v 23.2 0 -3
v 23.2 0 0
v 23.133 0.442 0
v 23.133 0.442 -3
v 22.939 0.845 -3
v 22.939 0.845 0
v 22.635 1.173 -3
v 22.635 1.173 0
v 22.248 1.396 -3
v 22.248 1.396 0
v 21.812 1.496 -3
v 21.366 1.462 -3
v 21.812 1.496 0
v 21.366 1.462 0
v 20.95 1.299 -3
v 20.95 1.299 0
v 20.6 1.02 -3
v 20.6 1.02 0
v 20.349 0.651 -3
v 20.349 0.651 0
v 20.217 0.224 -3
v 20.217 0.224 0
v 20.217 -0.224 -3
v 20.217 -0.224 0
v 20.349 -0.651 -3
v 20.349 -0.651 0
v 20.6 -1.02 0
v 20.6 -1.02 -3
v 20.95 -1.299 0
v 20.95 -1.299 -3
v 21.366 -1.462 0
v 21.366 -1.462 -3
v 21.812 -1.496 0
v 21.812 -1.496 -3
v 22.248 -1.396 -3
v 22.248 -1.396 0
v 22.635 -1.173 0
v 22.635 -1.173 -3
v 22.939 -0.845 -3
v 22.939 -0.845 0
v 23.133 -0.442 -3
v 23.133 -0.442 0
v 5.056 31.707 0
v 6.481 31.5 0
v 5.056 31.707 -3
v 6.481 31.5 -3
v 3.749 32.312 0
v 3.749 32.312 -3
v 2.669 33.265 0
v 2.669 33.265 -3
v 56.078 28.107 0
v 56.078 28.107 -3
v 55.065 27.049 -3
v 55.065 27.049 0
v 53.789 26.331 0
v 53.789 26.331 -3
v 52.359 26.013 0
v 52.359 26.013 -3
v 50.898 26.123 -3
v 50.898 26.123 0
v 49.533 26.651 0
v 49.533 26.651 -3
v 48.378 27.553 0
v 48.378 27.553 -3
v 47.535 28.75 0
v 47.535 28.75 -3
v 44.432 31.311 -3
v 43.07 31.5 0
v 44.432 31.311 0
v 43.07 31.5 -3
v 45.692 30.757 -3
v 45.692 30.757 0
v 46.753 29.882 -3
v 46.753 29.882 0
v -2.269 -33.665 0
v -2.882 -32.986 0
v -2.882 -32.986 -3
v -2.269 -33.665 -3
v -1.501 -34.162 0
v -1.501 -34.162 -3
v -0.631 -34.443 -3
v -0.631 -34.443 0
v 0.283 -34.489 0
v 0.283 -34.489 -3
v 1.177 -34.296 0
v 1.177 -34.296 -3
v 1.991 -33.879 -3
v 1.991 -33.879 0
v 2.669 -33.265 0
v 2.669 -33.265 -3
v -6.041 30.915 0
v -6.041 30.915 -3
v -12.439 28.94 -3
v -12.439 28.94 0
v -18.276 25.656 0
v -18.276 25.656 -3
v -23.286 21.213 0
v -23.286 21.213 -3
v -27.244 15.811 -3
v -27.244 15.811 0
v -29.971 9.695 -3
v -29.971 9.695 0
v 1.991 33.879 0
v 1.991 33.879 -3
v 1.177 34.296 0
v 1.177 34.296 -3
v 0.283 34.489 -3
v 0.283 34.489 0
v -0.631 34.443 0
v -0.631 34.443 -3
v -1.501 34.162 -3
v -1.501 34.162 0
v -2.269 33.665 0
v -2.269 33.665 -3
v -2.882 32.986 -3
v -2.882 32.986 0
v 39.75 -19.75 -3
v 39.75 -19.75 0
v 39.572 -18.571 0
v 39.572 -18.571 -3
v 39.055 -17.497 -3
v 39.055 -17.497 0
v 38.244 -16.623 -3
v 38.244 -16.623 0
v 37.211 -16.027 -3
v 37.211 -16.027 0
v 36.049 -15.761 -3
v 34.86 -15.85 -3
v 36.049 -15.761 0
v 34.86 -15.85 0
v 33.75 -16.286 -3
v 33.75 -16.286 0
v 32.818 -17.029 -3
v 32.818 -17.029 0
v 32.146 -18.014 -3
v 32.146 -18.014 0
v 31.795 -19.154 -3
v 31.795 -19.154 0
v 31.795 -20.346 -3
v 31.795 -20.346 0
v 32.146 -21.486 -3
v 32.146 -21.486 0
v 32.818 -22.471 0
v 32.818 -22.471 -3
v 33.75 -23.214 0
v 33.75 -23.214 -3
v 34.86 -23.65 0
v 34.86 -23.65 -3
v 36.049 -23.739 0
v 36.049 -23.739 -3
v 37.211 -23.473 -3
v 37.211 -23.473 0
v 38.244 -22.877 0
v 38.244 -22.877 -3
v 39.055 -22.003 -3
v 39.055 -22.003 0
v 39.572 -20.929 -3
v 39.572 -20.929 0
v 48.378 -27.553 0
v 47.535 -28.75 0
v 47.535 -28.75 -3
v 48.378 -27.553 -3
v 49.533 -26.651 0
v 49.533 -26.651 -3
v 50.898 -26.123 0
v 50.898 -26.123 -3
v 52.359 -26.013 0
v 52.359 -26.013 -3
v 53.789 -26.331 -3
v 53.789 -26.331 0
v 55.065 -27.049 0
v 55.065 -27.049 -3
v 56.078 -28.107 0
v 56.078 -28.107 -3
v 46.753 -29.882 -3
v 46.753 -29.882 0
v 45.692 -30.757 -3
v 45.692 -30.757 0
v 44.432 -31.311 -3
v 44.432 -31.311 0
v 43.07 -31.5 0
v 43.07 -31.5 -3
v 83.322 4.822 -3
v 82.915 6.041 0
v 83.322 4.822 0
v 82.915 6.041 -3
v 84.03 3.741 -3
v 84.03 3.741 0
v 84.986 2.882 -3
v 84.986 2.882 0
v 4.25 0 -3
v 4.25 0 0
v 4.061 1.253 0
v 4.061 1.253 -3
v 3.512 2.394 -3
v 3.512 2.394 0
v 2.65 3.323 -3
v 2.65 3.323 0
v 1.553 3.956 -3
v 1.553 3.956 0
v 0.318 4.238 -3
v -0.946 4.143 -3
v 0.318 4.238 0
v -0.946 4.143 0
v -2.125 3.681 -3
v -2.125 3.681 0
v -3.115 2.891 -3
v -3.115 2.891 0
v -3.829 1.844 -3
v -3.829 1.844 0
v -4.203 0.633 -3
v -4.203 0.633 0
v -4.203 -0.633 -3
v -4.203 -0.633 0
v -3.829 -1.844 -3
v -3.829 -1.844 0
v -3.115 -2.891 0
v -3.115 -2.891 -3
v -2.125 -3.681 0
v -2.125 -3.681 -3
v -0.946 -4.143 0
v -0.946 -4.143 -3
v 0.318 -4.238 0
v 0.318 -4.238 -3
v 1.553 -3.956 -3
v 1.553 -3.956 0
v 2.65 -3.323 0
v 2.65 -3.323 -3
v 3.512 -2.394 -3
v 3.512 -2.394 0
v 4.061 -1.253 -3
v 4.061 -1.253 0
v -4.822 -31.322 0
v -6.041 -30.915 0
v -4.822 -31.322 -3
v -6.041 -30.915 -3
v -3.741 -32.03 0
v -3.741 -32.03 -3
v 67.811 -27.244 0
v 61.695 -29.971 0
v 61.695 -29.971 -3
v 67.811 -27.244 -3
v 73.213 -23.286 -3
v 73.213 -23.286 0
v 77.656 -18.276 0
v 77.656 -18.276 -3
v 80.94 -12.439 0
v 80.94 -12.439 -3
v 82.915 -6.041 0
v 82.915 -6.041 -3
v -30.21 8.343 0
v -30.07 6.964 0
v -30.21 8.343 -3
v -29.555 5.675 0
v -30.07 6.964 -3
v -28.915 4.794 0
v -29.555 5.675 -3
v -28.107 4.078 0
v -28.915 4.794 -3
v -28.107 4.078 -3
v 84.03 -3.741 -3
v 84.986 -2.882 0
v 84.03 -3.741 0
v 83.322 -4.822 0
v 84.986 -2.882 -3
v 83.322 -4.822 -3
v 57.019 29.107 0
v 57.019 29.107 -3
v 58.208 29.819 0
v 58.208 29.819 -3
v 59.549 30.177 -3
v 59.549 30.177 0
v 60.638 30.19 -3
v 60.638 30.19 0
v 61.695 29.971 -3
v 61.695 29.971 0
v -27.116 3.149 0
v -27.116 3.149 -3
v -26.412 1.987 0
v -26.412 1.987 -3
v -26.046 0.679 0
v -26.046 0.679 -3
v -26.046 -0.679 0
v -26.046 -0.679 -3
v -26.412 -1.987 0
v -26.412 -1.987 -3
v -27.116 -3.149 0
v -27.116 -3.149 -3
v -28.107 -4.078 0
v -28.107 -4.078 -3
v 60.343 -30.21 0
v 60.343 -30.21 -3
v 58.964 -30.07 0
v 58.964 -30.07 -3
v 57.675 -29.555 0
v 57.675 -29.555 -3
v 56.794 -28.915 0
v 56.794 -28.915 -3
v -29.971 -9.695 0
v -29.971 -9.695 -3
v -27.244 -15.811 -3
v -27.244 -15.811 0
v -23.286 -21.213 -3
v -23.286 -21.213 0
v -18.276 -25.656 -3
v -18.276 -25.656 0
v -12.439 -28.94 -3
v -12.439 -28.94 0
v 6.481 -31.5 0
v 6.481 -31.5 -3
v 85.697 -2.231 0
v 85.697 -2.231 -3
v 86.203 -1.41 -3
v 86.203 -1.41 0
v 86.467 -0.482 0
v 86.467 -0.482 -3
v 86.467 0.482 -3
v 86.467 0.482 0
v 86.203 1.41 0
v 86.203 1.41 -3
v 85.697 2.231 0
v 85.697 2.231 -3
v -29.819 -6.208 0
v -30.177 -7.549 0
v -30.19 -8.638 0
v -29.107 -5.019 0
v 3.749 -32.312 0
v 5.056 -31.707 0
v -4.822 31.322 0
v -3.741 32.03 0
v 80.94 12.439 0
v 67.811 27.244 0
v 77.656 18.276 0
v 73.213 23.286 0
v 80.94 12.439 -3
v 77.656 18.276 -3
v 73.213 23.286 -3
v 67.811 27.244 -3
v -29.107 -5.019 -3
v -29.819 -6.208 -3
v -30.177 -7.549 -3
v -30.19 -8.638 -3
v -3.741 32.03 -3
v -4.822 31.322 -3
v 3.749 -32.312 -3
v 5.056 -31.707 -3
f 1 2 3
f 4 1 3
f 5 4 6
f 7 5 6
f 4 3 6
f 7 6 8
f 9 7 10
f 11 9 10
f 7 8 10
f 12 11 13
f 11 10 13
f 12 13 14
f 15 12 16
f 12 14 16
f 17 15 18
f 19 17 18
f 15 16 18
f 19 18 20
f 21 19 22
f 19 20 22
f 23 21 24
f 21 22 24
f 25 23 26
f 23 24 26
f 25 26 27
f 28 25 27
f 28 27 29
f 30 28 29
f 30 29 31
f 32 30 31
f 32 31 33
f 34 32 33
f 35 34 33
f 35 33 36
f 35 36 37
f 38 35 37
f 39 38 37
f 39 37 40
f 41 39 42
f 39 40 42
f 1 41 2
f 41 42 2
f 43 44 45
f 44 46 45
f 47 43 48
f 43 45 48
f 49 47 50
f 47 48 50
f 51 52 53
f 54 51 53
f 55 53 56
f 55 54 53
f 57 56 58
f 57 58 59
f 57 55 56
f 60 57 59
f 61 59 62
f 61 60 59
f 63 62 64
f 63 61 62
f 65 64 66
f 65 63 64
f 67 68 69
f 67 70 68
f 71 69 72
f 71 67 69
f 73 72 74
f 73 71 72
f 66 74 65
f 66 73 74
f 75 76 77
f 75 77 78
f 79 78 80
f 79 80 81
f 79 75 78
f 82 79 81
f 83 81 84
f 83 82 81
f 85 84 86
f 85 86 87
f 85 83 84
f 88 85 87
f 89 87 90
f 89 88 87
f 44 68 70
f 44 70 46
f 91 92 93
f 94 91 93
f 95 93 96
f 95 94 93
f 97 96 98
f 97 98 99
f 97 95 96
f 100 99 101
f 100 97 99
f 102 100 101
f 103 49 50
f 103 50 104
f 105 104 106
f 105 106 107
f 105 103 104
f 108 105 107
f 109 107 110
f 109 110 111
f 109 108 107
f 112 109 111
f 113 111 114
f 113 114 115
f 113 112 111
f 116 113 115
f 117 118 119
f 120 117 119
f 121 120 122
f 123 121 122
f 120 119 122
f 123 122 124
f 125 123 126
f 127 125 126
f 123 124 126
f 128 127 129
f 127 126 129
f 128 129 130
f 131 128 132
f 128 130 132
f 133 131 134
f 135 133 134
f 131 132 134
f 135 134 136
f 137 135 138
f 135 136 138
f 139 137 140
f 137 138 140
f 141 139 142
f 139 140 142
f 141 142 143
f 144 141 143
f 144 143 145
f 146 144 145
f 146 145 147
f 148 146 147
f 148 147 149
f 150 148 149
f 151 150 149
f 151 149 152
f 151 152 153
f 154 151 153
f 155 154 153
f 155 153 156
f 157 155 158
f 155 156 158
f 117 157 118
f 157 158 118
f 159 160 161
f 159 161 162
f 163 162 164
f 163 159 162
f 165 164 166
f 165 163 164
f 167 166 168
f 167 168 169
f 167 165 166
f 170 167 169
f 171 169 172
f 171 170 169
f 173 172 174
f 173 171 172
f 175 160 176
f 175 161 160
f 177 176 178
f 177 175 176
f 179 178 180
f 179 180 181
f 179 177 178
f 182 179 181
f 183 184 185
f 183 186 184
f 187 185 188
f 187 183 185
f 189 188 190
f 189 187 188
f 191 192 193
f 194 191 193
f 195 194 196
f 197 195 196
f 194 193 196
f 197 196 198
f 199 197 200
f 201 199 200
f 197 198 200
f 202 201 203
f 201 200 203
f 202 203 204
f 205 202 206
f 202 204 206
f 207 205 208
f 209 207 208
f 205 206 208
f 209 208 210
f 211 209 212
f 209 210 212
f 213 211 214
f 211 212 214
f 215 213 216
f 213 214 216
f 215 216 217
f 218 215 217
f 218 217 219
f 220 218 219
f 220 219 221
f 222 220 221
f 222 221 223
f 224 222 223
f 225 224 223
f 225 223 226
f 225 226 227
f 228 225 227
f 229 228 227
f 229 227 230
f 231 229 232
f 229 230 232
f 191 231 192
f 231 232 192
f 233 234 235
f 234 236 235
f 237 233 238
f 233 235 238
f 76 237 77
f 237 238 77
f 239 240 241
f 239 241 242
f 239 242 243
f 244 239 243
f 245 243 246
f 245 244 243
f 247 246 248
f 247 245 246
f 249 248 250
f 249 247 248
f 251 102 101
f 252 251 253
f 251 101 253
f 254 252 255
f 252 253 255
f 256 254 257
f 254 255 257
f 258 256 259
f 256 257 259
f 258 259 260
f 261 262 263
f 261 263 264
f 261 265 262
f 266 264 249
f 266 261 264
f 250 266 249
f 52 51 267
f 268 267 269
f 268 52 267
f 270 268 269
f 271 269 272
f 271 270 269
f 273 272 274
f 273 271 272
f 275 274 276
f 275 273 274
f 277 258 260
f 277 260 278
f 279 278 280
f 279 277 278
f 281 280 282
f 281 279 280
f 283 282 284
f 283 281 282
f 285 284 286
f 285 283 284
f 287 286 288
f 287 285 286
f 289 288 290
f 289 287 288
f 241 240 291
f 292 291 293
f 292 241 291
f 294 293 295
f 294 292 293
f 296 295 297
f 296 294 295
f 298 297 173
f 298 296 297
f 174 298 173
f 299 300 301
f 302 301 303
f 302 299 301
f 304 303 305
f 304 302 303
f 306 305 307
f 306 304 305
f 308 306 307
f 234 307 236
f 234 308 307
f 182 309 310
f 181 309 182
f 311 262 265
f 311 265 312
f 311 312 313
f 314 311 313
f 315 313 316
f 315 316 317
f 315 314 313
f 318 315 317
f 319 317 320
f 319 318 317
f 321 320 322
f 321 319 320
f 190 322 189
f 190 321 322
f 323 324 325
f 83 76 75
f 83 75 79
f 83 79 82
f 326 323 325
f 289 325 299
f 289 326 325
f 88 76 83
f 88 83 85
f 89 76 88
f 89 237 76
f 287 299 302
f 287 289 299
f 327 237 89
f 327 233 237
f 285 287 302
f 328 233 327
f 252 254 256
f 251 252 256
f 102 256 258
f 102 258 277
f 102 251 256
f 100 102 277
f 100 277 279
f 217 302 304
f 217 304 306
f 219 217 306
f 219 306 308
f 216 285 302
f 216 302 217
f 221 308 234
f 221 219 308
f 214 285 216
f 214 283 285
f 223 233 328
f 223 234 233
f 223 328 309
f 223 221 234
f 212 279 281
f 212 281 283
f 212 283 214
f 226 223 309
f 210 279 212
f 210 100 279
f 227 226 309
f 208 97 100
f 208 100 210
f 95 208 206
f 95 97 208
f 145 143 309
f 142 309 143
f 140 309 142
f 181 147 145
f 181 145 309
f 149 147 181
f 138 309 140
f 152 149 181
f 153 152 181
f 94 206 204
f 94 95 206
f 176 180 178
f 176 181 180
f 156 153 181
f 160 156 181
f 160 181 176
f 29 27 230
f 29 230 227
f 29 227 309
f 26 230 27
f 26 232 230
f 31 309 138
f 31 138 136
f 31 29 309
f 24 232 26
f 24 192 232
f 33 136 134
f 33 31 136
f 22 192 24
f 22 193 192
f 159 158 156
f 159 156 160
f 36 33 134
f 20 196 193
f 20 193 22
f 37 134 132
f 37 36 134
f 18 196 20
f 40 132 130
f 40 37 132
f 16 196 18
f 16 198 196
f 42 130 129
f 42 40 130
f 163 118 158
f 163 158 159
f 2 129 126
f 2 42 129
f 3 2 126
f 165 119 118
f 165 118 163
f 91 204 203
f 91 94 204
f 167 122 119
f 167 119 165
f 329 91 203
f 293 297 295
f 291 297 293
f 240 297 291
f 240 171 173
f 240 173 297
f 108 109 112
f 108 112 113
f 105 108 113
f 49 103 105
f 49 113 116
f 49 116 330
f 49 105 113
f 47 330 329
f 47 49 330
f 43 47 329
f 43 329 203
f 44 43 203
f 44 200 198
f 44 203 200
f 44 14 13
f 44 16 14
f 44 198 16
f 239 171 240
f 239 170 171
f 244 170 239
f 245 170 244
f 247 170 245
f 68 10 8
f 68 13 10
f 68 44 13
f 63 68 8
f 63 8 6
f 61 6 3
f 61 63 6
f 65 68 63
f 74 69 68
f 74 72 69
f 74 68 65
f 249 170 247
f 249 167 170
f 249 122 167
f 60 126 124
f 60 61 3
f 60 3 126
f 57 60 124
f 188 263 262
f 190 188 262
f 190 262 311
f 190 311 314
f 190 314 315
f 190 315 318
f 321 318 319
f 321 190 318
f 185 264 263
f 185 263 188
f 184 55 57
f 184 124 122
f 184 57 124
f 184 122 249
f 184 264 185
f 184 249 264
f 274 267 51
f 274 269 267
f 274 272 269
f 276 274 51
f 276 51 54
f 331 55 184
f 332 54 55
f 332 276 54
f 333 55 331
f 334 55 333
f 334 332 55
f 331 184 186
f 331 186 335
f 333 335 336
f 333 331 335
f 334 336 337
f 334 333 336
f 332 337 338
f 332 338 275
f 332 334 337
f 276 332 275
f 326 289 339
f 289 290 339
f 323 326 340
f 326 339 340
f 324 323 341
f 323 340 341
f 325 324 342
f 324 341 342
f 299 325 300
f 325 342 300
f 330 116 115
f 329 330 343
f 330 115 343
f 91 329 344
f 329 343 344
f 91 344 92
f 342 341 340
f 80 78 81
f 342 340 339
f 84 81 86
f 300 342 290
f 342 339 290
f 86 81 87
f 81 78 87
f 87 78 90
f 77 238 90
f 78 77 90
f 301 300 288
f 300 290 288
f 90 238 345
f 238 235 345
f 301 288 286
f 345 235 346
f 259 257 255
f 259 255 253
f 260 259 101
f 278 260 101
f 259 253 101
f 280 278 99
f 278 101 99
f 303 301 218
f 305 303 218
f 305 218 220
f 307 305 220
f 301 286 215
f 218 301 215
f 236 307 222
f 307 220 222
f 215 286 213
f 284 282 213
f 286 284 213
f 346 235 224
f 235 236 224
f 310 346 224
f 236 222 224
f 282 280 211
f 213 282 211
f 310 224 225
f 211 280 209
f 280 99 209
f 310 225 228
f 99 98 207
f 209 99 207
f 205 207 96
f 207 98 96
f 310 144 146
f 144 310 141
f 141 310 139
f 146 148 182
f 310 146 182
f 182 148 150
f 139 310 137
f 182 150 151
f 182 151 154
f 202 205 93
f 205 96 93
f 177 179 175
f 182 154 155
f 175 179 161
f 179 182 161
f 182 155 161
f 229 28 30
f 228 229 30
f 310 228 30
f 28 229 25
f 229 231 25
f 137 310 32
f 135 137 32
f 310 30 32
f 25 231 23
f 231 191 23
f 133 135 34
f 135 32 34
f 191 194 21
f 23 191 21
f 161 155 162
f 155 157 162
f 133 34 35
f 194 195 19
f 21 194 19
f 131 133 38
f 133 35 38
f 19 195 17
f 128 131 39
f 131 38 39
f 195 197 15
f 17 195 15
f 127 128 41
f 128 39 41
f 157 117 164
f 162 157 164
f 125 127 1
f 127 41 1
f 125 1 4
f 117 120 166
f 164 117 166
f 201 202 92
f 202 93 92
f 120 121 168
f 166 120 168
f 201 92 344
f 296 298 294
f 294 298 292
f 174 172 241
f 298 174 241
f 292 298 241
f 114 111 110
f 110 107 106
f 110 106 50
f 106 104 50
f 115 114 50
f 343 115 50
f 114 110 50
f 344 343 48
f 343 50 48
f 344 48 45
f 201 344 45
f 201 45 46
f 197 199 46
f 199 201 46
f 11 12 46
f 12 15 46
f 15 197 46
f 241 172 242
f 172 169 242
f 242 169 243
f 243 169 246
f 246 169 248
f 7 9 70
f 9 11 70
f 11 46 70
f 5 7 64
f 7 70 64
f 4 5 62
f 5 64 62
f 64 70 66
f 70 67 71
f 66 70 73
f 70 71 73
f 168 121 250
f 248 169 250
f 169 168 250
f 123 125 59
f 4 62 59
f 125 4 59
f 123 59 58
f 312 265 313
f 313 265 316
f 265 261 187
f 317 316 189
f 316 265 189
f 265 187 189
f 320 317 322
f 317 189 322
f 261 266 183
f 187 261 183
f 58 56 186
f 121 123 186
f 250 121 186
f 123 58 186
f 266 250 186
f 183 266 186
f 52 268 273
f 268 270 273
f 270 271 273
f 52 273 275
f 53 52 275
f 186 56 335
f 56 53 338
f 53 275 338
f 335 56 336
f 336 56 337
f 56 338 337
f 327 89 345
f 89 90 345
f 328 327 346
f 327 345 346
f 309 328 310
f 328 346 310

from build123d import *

# Parameters (mm, degrees)
SKETCH1_R           = 4
SKETCH1_R_2         = 4.25
SKETCH1_R_3         = 1.5
BOSS_EXTRUDE1_DEPTH = 3
FILLET1_R           = 5


with BuildPart() as part:
    # Sketch1 → Boss-Extrude1 (new body)
    with BuildSketch(Plane.XY):
        with BuildLine():
            Line((47.025062814, 31.5), (3.464101615, 31.5))
            ThreePointArc((3.464101615, 31.5), (-0.097423396, 34.498643835), (-3.486558103, 31.306451613))
            ThreePointArc((-3.486558103, 31.306451613), (-21.727681967, 22.80696903), (-31.100806452, 4.998983703))
            ThreePointArc((-31.100806452, 4.998983703), (-26, 0), (-31.100806452, -4.998983703))
            ThreePointArc((-31.100806452, -4.998983703), (-21.727681967, -22.80696903), (-3.486558103, -31.306451613))
            ThreePointArc((-3.486558103, -31.306451613), (-0.097423396, -34.498643835), (3.464101615, -31.5))
            Line((3.464101615, -31.5), (47.025062814, -31.5))
            ThreePointArc((47.025062814, -31.5), (51.800041427, -26.003999943), (56.998983703, -31.100806452))
            ThreePointArc((56.998983703, -31.100806452), (74.80696903, -21.727681967), (83.306451613, -3.486558103))
            ThreePointArc((83.306451613, -3.486558103), (86.5, 0), (83.306451613, 3.486558103))
            ThreePointArc((83.306451613, 3.486558103), (74.80696903, 21.727681967), (56.998983703, 31.100806452))
            ThreePointArc((56.998983703, 31.100806452), (51.800041427, 26.003999943), (47.025062814, 31.5))
        make_face()
        with Locations((35.75, -19.75)):
            Circle(SKETCH1_R, mode=Mode.SUBTRACT)
        Circle(SKETCH1_R_2, mode=Mode.SUBTRACT)
        with Locations((21.7, 0)):
            Circle(SKETCH1_R_3, mode=Mode.SUBTRACT)
    extrude(amount=-BOSS_EXTRUDE1_DEPTH)

    # Fillet1
    fillet1_edges = [part.edges().sort_by_distance(p)[0] for p in [
        (3.464101615, 31.5, -1.5),
        (47.025062814, 31.5, -1.5),
        (56.998983703, 31.100806452, -1.5),
        (83.306451613, 3.486558103, -1.5),
        (83.306451613, -3.486558103, -1.5),
        (56.998983703, -31.100806452, -1.5),
        (47.025062814, -31.5, -1.5),
        (3.464101615, -31.5, -1.5),
        (-3.486558103, -31.306451613, -1.5),
        (-31.100806452, -4.998983703, -1.5),
        (-31.100806452, 4.998983703, -1.5),
        (-3.486558103, 31.306451613, -1.5),
    ]]
    fillet(fillet1_edges, radius=FILLET1_R)


solid = part.part
